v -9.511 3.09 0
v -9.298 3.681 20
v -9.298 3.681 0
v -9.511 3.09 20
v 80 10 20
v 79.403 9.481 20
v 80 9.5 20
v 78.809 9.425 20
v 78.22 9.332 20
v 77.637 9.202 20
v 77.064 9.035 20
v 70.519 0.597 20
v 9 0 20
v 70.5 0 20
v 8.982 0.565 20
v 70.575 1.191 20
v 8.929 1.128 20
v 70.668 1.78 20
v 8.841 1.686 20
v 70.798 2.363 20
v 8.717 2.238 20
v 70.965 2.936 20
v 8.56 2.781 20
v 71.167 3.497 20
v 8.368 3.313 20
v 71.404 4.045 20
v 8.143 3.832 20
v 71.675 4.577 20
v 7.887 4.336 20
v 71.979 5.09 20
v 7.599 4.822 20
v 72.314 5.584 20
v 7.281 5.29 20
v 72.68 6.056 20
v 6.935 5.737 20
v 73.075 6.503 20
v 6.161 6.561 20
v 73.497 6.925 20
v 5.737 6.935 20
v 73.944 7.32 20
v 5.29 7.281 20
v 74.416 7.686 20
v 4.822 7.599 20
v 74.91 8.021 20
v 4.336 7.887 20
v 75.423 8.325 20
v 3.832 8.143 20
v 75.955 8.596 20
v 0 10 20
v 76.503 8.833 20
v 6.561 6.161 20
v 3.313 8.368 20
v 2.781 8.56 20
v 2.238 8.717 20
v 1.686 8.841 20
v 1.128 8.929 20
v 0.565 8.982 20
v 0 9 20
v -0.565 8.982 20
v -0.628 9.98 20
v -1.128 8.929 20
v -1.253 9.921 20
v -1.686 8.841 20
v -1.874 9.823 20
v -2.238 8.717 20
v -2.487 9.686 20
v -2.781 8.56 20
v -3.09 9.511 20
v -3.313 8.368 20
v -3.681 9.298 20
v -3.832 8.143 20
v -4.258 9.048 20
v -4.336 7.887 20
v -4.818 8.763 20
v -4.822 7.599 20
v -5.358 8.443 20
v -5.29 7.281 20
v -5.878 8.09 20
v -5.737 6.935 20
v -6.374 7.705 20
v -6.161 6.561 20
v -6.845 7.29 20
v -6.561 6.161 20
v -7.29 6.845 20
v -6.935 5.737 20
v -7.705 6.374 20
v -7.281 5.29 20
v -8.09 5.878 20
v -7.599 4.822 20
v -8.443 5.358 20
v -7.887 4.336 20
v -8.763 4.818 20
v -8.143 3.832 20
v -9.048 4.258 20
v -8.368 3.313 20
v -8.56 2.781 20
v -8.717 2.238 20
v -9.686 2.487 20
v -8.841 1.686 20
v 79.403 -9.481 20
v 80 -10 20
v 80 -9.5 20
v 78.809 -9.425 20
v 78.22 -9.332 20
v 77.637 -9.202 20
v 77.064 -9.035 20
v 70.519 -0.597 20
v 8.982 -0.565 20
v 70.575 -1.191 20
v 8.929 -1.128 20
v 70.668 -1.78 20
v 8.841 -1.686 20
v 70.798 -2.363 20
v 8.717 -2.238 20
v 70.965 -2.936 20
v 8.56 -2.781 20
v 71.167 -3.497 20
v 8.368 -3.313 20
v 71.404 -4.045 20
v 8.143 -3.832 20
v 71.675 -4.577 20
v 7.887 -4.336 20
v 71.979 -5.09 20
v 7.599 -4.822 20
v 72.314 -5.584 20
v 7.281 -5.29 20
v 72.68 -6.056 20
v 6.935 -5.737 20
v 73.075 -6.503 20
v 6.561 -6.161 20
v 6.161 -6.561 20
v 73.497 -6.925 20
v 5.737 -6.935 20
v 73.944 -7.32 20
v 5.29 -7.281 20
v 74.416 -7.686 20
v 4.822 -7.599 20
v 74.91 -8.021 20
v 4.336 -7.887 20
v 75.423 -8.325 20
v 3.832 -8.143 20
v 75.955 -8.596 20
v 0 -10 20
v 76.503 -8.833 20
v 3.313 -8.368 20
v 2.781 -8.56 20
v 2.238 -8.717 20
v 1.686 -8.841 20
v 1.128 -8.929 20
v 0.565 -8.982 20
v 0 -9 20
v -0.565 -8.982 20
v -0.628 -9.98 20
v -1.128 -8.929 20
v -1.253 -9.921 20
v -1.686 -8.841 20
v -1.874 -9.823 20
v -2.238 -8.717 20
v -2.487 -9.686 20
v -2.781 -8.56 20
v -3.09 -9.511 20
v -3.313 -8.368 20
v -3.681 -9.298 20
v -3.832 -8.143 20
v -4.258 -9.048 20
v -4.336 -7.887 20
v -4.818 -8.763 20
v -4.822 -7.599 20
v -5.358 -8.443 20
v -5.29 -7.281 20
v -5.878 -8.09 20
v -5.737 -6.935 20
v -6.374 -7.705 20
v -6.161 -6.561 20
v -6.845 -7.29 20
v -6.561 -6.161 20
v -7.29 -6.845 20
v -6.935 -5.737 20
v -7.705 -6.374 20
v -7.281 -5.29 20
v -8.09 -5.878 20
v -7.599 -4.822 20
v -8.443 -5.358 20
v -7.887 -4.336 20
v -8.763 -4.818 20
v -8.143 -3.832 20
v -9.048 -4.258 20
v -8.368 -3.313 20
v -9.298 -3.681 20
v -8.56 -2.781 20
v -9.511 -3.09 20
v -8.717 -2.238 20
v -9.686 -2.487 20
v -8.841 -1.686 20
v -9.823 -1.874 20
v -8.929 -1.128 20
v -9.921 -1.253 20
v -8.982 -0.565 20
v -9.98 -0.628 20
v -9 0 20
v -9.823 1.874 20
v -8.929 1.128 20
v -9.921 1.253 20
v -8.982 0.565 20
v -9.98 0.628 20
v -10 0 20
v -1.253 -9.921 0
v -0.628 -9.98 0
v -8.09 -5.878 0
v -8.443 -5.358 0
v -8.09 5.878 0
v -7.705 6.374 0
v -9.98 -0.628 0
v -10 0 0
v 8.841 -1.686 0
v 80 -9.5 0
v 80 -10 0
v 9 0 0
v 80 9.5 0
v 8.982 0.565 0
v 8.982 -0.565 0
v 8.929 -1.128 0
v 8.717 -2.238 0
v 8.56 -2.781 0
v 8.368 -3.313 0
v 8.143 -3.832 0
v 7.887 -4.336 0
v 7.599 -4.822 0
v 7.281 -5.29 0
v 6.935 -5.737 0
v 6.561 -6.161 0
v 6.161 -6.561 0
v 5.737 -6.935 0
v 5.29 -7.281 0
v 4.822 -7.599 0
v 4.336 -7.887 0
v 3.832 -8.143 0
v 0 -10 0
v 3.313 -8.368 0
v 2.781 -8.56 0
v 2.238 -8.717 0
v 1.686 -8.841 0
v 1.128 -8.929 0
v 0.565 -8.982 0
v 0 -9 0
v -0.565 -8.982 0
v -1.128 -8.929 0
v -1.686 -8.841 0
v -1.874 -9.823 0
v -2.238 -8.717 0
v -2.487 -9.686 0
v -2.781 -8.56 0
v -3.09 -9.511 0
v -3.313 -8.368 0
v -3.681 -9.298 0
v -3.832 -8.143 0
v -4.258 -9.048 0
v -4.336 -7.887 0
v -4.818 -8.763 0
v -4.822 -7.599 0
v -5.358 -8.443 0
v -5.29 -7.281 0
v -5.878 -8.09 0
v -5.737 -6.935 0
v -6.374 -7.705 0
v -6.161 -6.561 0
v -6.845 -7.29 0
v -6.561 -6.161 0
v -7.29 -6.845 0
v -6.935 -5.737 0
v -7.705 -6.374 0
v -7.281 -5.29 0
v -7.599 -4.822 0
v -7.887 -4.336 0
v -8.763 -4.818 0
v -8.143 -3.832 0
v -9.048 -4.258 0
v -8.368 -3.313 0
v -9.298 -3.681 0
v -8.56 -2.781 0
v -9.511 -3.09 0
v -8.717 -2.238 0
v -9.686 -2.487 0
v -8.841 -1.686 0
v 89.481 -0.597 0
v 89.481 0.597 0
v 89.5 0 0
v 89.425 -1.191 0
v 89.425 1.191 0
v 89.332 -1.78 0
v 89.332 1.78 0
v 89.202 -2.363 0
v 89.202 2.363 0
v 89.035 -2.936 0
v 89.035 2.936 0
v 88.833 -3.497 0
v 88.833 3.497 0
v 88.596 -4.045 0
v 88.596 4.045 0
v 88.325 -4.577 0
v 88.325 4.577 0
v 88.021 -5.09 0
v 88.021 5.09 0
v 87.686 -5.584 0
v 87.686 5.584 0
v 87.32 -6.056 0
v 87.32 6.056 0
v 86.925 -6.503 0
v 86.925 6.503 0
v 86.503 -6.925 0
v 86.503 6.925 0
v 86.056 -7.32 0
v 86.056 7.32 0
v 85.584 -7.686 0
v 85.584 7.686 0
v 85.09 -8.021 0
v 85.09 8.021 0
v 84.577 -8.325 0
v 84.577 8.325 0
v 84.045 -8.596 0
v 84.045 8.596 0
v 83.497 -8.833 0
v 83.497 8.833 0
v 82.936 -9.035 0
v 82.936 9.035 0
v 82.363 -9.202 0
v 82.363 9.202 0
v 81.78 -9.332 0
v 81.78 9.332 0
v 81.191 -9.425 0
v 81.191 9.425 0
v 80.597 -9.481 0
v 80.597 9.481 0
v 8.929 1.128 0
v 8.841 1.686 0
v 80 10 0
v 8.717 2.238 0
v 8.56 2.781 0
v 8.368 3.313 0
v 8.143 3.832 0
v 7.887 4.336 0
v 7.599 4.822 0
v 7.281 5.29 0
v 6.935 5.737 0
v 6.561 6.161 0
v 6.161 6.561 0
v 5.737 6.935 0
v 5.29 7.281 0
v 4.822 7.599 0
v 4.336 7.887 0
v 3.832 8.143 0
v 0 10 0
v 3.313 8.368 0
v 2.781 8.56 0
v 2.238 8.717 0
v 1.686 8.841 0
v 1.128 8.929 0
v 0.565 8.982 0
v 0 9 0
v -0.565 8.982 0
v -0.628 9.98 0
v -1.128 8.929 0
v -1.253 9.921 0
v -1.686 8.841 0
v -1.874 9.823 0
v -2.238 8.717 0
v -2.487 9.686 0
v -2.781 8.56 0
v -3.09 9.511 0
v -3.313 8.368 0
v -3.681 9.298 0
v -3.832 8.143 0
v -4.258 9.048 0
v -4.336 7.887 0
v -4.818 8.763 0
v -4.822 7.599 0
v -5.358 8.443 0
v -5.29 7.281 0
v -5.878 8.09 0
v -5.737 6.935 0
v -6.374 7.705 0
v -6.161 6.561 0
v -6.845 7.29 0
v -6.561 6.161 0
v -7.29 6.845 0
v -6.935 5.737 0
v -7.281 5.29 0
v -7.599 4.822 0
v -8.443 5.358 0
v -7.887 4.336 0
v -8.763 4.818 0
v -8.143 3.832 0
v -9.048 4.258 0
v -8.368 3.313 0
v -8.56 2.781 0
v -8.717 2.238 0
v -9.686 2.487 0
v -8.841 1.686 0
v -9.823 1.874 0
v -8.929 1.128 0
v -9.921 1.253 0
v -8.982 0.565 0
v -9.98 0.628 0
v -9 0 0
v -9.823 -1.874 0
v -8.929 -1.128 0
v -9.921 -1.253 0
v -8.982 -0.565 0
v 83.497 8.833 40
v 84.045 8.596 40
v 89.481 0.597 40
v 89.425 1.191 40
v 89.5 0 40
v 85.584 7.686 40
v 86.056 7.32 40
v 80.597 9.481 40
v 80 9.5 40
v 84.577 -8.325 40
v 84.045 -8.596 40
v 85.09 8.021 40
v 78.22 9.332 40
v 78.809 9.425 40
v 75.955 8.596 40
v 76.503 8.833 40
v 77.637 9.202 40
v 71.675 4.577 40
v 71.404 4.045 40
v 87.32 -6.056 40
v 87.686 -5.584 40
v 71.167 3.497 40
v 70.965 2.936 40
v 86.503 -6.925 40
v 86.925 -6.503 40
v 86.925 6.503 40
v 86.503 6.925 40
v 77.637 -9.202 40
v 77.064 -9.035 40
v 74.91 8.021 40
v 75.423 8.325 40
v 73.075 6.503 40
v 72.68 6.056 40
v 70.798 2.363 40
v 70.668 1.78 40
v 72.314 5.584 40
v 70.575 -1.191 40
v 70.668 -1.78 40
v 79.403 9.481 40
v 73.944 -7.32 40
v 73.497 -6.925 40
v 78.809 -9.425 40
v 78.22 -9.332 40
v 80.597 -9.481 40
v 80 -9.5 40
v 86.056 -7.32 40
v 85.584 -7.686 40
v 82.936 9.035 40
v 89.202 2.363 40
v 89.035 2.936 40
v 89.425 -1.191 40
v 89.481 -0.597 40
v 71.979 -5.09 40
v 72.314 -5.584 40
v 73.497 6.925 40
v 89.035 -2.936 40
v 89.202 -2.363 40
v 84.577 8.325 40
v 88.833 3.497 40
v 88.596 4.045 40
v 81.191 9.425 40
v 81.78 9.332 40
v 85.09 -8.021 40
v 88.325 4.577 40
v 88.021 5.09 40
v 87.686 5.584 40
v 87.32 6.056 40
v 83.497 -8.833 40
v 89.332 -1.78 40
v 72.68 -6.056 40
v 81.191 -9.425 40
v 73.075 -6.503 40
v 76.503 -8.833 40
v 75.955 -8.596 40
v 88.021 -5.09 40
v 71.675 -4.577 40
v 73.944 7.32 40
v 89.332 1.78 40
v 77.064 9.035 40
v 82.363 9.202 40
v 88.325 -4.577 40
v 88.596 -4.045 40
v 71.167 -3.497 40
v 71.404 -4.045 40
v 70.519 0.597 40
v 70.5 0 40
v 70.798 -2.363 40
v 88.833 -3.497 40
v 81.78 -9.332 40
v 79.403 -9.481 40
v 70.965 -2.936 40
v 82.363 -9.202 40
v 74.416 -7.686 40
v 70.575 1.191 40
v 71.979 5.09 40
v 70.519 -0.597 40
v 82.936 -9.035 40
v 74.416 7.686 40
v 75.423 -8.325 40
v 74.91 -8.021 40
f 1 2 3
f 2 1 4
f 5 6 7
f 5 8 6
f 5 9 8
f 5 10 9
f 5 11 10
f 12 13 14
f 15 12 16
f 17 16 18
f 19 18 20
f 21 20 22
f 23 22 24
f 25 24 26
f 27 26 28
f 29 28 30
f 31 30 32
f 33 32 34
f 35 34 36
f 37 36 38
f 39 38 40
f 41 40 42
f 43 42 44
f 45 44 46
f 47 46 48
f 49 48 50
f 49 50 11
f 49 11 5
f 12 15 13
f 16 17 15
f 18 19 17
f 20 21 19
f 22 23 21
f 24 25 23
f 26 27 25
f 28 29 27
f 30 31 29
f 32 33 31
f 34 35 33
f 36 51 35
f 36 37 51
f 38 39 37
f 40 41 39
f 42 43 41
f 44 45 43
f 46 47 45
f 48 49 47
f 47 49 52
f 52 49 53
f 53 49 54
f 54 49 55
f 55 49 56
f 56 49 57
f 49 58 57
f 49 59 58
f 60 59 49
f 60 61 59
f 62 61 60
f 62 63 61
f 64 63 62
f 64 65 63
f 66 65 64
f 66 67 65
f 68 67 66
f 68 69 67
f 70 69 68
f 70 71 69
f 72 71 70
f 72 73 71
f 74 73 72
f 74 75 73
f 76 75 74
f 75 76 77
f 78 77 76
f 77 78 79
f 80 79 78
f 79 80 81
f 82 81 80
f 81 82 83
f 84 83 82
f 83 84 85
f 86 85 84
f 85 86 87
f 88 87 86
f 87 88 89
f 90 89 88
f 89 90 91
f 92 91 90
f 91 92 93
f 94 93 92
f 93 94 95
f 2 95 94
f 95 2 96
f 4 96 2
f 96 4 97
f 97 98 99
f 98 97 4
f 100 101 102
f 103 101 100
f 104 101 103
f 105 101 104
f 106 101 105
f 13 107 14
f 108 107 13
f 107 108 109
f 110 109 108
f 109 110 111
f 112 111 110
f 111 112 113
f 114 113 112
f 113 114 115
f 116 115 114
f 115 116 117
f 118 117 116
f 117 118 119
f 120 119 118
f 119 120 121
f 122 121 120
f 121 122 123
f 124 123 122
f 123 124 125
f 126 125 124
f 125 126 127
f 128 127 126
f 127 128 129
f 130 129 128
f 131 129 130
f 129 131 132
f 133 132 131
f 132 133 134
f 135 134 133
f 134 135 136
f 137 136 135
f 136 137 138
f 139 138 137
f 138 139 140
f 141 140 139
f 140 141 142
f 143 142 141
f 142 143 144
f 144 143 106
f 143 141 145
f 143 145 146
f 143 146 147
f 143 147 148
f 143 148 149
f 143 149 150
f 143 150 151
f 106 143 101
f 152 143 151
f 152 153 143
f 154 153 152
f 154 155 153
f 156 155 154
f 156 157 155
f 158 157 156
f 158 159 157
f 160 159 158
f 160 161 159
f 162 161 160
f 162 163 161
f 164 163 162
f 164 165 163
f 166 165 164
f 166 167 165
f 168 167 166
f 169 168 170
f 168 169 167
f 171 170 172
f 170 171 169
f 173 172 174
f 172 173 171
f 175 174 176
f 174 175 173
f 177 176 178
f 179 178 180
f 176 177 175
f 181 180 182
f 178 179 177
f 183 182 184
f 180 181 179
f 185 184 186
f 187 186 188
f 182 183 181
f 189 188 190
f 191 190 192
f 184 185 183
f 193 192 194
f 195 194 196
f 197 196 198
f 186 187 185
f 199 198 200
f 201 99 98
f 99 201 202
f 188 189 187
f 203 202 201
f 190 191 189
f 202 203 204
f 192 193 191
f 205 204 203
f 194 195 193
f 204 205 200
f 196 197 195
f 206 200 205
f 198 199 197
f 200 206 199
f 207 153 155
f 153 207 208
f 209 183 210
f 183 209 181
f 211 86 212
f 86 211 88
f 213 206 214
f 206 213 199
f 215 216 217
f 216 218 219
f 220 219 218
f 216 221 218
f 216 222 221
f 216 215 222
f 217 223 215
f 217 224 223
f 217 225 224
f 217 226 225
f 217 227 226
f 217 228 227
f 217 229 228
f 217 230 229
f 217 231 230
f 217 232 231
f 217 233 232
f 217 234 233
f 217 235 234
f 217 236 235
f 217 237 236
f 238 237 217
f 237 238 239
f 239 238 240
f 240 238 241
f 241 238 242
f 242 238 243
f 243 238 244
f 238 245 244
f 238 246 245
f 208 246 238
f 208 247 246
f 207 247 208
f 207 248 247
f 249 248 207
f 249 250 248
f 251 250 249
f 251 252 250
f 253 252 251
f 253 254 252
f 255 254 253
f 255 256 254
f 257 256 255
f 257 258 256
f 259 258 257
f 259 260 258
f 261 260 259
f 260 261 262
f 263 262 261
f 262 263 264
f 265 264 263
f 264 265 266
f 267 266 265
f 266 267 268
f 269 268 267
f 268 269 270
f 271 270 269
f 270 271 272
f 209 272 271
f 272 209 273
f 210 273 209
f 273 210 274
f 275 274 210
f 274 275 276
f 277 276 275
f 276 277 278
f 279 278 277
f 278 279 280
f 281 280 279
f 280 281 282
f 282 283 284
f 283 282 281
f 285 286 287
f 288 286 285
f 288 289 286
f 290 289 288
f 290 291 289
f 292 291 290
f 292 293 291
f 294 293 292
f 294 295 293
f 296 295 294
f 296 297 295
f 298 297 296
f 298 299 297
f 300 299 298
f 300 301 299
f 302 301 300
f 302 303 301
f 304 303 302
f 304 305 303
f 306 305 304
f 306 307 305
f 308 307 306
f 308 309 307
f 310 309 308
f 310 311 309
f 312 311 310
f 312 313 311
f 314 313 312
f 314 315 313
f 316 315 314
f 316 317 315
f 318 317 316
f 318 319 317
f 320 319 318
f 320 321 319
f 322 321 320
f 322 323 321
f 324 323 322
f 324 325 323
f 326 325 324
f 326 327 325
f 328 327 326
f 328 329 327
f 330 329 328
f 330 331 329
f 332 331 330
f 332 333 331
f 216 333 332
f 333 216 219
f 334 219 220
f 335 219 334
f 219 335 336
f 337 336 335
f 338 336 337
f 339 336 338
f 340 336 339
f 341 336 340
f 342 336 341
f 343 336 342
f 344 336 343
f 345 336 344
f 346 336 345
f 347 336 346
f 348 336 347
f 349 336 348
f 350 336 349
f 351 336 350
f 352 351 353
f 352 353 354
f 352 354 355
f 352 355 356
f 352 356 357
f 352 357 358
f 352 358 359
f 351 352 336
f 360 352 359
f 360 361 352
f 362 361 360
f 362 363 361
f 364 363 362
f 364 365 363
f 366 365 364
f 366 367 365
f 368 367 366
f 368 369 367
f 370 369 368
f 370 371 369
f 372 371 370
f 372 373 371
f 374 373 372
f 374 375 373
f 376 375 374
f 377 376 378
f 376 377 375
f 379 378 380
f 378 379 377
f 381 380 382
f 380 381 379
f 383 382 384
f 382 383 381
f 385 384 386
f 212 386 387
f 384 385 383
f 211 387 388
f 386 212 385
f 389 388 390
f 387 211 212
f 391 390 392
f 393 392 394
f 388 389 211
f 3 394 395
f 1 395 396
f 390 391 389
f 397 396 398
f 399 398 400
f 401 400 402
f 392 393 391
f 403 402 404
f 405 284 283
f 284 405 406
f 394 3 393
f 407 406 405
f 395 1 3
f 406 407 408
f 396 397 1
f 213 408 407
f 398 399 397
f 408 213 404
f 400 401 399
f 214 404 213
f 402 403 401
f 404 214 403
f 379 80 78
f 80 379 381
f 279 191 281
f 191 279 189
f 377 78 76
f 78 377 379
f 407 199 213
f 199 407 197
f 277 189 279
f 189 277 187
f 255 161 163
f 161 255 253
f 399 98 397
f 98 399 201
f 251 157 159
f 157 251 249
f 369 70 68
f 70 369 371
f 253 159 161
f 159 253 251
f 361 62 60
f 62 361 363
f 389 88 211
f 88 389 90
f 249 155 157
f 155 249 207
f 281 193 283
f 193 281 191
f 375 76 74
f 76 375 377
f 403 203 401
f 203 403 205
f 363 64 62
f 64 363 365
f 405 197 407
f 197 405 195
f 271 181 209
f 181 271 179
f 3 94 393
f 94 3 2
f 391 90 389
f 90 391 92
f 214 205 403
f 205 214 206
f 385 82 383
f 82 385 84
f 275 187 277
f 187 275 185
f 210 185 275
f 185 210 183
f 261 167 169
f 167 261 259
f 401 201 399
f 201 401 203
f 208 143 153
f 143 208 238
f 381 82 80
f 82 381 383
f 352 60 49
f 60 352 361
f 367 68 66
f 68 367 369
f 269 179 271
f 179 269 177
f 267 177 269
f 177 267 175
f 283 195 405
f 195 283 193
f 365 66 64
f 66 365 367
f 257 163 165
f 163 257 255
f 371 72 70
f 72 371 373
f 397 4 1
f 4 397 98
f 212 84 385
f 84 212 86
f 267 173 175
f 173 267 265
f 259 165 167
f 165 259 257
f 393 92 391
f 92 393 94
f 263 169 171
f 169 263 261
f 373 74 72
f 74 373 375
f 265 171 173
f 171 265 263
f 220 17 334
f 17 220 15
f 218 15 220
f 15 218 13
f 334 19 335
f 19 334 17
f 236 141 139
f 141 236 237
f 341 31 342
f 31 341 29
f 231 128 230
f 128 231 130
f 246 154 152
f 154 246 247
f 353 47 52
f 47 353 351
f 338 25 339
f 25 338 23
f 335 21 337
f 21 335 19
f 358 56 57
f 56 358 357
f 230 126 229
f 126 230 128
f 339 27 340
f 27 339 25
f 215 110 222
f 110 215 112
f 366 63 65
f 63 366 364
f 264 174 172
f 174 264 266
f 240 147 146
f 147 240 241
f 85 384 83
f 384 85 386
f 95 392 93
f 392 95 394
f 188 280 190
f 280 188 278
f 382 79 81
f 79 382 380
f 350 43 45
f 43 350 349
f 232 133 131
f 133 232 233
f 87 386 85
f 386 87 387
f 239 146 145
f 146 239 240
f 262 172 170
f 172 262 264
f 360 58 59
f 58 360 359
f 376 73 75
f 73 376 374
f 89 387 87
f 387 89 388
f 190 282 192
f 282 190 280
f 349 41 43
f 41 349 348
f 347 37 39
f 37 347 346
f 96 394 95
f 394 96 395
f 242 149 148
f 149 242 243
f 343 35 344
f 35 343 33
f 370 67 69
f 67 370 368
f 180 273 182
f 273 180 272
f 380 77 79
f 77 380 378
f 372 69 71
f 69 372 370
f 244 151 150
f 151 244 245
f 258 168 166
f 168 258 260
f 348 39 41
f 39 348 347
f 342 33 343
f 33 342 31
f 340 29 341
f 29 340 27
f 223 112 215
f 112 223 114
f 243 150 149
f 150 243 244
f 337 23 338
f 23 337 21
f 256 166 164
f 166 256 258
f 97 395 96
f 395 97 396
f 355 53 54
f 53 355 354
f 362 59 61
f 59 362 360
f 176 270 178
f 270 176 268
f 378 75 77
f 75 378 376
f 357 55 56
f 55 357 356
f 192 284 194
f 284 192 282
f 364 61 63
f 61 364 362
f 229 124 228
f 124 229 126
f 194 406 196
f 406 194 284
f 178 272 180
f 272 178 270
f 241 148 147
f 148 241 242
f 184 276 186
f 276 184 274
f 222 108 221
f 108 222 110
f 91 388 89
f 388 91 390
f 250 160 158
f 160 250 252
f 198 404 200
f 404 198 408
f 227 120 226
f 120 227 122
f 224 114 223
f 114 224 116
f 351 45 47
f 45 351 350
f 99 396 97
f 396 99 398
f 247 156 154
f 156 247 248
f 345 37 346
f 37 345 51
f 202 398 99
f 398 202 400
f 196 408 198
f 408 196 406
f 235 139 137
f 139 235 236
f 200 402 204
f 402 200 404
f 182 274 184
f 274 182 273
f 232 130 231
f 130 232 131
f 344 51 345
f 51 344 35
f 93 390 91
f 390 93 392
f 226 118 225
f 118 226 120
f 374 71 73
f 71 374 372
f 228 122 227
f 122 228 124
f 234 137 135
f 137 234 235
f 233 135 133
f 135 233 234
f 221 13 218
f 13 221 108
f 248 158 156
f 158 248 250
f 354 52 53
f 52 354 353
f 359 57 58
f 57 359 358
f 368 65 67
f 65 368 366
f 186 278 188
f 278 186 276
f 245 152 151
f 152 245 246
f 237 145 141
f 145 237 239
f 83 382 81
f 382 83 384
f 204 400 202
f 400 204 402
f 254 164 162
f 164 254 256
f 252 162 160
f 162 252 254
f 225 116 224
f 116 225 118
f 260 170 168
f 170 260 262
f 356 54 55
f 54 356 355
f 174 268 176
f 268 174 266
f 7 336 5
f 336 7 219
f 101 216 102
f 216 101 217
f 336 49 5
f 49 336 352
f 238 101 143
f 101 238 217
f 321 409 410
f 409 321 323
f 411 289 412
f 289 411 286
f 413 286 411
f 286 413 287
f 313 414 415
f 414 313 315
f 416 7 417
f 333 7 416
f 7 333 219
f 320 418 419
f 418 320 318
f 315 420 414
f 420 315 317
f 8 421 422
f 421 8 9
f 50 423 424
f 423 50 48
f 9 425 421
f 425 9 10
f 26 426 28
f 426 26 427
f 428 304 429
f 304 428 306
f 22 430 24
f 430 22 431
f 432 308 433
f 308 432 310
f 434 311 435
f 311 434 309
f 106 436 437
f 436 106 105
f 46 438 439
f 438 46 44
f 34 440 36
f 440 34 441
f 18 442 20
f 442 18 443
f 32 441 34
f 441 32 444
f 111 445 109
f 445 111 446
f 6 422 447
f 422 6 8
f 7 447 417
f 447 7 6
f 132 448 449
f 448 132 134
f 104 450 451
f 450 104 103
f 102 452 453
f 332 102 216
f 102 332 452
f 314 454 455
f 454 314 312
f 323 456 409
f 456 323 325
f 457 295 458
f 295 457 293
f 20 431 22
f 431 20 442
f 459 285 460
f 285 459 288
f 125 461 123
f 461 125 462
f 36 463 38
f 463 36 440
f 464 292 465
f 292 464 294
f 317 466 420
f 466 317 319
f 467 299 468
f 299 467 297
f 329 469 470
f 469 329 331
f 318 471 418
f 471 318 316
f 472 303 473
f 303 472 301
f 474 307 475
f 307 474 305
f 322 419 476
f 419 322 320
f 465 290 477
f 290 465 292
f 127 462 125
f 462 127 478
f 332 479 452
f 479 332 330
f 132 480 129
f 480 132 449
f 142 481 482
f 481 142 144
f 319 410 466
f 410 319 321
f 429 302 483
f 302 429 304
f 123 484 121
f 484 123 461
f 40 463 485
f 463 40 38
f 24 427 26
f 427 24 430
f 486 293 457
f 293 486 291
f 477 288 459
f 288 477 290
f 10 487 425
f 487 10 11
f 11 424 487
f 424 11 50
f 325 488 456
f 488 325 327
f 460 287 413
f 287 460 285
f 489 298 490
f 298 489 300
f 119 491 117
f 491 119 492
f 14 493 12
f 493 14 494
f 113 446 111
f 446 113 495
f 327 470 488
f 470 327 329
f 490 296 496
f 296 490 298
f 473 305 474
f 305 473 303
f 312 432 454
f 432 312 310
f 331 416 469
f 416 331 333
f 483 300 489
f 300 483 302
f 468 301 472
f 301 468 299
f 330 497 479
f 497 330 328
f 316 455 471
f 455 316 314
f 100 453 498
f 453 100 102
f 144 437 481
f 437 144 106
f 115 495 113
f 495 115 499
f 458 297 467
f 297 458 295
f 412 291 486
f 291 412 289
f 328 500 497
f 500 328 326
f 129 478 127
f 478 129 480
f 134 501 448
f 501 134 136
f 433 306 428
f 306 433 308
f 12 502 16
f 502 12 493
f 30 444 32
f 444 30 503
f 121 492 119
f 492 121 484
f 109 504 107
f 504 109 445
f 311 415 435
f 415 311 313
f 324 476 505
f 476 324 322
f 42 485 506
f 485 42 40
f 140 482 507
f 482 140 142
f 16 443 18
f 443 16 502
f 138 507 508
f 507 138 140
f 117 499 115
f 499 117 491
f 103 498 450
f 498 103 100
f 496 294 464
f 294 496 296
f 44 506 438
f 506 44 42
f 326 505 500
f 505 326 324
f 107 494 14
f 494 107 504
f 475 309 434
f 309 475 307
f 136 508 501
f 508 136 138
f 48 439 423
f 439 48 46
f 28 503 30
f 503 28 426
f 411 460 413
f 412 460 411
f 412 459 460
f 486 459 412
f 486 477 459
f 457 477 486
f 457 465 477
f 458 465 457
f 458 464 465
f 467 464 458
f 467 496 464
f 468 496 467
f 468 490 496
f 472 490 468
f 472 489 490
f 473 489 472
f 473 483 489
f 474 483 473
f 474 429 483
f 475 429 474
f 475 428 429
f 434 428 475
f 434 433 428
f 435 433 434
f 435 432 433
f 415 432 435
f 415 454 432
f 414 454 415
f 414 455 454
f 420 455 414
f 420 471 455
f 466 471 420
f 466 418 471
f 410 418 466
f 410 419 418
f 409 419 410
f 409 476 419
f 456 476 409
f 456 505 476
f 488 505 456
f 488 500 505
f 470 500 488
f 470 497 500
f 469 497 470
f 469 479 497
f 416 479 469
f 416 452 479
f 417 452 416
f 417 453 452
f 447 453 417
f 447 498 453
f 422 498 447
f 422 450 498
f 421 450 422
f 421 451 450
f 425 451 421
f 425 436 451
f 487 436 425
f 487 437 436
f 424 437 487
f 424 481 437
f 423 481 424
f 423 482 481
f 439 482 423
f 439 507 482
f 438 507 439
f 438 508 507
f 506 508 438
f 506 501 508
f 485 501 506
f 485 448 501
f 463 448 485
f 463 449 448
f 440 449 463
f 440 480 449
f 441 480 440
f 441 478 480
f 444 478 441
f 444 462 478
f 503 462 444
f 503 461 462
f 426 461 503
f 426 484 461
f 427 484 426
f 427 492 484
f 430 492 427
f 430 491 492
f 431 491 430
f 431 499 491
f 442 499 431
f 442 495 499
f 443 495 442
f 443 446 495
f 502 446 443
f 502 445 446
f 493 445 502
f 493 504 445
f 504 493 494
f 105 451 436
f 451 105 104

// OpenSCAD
segmentLength=80;
pinDiameter=20;
pinHeight=20;

$fn=100;

//hole
difference(){
    cylinder(d=pinDiameter,h=pinHeight);
    translate([0,0,-1]){
        cylinder(d=pinDiameter-2,h=pinHeight+2);
    }
}
//segment
difference(){
    translate([0,-pinDiameter/2,0]){
        cube([segmentLength,pinDiameter,pinHeight]);
    }
    translate([0,0,-1]){
        cylinder(d=pinDiameter-2,h=pinHeight+2);
    }
}
//pin
translate([segmentLength,0,0]){
    cylinder(d=pinDiameter-1,h=pinHeight*2);
}
